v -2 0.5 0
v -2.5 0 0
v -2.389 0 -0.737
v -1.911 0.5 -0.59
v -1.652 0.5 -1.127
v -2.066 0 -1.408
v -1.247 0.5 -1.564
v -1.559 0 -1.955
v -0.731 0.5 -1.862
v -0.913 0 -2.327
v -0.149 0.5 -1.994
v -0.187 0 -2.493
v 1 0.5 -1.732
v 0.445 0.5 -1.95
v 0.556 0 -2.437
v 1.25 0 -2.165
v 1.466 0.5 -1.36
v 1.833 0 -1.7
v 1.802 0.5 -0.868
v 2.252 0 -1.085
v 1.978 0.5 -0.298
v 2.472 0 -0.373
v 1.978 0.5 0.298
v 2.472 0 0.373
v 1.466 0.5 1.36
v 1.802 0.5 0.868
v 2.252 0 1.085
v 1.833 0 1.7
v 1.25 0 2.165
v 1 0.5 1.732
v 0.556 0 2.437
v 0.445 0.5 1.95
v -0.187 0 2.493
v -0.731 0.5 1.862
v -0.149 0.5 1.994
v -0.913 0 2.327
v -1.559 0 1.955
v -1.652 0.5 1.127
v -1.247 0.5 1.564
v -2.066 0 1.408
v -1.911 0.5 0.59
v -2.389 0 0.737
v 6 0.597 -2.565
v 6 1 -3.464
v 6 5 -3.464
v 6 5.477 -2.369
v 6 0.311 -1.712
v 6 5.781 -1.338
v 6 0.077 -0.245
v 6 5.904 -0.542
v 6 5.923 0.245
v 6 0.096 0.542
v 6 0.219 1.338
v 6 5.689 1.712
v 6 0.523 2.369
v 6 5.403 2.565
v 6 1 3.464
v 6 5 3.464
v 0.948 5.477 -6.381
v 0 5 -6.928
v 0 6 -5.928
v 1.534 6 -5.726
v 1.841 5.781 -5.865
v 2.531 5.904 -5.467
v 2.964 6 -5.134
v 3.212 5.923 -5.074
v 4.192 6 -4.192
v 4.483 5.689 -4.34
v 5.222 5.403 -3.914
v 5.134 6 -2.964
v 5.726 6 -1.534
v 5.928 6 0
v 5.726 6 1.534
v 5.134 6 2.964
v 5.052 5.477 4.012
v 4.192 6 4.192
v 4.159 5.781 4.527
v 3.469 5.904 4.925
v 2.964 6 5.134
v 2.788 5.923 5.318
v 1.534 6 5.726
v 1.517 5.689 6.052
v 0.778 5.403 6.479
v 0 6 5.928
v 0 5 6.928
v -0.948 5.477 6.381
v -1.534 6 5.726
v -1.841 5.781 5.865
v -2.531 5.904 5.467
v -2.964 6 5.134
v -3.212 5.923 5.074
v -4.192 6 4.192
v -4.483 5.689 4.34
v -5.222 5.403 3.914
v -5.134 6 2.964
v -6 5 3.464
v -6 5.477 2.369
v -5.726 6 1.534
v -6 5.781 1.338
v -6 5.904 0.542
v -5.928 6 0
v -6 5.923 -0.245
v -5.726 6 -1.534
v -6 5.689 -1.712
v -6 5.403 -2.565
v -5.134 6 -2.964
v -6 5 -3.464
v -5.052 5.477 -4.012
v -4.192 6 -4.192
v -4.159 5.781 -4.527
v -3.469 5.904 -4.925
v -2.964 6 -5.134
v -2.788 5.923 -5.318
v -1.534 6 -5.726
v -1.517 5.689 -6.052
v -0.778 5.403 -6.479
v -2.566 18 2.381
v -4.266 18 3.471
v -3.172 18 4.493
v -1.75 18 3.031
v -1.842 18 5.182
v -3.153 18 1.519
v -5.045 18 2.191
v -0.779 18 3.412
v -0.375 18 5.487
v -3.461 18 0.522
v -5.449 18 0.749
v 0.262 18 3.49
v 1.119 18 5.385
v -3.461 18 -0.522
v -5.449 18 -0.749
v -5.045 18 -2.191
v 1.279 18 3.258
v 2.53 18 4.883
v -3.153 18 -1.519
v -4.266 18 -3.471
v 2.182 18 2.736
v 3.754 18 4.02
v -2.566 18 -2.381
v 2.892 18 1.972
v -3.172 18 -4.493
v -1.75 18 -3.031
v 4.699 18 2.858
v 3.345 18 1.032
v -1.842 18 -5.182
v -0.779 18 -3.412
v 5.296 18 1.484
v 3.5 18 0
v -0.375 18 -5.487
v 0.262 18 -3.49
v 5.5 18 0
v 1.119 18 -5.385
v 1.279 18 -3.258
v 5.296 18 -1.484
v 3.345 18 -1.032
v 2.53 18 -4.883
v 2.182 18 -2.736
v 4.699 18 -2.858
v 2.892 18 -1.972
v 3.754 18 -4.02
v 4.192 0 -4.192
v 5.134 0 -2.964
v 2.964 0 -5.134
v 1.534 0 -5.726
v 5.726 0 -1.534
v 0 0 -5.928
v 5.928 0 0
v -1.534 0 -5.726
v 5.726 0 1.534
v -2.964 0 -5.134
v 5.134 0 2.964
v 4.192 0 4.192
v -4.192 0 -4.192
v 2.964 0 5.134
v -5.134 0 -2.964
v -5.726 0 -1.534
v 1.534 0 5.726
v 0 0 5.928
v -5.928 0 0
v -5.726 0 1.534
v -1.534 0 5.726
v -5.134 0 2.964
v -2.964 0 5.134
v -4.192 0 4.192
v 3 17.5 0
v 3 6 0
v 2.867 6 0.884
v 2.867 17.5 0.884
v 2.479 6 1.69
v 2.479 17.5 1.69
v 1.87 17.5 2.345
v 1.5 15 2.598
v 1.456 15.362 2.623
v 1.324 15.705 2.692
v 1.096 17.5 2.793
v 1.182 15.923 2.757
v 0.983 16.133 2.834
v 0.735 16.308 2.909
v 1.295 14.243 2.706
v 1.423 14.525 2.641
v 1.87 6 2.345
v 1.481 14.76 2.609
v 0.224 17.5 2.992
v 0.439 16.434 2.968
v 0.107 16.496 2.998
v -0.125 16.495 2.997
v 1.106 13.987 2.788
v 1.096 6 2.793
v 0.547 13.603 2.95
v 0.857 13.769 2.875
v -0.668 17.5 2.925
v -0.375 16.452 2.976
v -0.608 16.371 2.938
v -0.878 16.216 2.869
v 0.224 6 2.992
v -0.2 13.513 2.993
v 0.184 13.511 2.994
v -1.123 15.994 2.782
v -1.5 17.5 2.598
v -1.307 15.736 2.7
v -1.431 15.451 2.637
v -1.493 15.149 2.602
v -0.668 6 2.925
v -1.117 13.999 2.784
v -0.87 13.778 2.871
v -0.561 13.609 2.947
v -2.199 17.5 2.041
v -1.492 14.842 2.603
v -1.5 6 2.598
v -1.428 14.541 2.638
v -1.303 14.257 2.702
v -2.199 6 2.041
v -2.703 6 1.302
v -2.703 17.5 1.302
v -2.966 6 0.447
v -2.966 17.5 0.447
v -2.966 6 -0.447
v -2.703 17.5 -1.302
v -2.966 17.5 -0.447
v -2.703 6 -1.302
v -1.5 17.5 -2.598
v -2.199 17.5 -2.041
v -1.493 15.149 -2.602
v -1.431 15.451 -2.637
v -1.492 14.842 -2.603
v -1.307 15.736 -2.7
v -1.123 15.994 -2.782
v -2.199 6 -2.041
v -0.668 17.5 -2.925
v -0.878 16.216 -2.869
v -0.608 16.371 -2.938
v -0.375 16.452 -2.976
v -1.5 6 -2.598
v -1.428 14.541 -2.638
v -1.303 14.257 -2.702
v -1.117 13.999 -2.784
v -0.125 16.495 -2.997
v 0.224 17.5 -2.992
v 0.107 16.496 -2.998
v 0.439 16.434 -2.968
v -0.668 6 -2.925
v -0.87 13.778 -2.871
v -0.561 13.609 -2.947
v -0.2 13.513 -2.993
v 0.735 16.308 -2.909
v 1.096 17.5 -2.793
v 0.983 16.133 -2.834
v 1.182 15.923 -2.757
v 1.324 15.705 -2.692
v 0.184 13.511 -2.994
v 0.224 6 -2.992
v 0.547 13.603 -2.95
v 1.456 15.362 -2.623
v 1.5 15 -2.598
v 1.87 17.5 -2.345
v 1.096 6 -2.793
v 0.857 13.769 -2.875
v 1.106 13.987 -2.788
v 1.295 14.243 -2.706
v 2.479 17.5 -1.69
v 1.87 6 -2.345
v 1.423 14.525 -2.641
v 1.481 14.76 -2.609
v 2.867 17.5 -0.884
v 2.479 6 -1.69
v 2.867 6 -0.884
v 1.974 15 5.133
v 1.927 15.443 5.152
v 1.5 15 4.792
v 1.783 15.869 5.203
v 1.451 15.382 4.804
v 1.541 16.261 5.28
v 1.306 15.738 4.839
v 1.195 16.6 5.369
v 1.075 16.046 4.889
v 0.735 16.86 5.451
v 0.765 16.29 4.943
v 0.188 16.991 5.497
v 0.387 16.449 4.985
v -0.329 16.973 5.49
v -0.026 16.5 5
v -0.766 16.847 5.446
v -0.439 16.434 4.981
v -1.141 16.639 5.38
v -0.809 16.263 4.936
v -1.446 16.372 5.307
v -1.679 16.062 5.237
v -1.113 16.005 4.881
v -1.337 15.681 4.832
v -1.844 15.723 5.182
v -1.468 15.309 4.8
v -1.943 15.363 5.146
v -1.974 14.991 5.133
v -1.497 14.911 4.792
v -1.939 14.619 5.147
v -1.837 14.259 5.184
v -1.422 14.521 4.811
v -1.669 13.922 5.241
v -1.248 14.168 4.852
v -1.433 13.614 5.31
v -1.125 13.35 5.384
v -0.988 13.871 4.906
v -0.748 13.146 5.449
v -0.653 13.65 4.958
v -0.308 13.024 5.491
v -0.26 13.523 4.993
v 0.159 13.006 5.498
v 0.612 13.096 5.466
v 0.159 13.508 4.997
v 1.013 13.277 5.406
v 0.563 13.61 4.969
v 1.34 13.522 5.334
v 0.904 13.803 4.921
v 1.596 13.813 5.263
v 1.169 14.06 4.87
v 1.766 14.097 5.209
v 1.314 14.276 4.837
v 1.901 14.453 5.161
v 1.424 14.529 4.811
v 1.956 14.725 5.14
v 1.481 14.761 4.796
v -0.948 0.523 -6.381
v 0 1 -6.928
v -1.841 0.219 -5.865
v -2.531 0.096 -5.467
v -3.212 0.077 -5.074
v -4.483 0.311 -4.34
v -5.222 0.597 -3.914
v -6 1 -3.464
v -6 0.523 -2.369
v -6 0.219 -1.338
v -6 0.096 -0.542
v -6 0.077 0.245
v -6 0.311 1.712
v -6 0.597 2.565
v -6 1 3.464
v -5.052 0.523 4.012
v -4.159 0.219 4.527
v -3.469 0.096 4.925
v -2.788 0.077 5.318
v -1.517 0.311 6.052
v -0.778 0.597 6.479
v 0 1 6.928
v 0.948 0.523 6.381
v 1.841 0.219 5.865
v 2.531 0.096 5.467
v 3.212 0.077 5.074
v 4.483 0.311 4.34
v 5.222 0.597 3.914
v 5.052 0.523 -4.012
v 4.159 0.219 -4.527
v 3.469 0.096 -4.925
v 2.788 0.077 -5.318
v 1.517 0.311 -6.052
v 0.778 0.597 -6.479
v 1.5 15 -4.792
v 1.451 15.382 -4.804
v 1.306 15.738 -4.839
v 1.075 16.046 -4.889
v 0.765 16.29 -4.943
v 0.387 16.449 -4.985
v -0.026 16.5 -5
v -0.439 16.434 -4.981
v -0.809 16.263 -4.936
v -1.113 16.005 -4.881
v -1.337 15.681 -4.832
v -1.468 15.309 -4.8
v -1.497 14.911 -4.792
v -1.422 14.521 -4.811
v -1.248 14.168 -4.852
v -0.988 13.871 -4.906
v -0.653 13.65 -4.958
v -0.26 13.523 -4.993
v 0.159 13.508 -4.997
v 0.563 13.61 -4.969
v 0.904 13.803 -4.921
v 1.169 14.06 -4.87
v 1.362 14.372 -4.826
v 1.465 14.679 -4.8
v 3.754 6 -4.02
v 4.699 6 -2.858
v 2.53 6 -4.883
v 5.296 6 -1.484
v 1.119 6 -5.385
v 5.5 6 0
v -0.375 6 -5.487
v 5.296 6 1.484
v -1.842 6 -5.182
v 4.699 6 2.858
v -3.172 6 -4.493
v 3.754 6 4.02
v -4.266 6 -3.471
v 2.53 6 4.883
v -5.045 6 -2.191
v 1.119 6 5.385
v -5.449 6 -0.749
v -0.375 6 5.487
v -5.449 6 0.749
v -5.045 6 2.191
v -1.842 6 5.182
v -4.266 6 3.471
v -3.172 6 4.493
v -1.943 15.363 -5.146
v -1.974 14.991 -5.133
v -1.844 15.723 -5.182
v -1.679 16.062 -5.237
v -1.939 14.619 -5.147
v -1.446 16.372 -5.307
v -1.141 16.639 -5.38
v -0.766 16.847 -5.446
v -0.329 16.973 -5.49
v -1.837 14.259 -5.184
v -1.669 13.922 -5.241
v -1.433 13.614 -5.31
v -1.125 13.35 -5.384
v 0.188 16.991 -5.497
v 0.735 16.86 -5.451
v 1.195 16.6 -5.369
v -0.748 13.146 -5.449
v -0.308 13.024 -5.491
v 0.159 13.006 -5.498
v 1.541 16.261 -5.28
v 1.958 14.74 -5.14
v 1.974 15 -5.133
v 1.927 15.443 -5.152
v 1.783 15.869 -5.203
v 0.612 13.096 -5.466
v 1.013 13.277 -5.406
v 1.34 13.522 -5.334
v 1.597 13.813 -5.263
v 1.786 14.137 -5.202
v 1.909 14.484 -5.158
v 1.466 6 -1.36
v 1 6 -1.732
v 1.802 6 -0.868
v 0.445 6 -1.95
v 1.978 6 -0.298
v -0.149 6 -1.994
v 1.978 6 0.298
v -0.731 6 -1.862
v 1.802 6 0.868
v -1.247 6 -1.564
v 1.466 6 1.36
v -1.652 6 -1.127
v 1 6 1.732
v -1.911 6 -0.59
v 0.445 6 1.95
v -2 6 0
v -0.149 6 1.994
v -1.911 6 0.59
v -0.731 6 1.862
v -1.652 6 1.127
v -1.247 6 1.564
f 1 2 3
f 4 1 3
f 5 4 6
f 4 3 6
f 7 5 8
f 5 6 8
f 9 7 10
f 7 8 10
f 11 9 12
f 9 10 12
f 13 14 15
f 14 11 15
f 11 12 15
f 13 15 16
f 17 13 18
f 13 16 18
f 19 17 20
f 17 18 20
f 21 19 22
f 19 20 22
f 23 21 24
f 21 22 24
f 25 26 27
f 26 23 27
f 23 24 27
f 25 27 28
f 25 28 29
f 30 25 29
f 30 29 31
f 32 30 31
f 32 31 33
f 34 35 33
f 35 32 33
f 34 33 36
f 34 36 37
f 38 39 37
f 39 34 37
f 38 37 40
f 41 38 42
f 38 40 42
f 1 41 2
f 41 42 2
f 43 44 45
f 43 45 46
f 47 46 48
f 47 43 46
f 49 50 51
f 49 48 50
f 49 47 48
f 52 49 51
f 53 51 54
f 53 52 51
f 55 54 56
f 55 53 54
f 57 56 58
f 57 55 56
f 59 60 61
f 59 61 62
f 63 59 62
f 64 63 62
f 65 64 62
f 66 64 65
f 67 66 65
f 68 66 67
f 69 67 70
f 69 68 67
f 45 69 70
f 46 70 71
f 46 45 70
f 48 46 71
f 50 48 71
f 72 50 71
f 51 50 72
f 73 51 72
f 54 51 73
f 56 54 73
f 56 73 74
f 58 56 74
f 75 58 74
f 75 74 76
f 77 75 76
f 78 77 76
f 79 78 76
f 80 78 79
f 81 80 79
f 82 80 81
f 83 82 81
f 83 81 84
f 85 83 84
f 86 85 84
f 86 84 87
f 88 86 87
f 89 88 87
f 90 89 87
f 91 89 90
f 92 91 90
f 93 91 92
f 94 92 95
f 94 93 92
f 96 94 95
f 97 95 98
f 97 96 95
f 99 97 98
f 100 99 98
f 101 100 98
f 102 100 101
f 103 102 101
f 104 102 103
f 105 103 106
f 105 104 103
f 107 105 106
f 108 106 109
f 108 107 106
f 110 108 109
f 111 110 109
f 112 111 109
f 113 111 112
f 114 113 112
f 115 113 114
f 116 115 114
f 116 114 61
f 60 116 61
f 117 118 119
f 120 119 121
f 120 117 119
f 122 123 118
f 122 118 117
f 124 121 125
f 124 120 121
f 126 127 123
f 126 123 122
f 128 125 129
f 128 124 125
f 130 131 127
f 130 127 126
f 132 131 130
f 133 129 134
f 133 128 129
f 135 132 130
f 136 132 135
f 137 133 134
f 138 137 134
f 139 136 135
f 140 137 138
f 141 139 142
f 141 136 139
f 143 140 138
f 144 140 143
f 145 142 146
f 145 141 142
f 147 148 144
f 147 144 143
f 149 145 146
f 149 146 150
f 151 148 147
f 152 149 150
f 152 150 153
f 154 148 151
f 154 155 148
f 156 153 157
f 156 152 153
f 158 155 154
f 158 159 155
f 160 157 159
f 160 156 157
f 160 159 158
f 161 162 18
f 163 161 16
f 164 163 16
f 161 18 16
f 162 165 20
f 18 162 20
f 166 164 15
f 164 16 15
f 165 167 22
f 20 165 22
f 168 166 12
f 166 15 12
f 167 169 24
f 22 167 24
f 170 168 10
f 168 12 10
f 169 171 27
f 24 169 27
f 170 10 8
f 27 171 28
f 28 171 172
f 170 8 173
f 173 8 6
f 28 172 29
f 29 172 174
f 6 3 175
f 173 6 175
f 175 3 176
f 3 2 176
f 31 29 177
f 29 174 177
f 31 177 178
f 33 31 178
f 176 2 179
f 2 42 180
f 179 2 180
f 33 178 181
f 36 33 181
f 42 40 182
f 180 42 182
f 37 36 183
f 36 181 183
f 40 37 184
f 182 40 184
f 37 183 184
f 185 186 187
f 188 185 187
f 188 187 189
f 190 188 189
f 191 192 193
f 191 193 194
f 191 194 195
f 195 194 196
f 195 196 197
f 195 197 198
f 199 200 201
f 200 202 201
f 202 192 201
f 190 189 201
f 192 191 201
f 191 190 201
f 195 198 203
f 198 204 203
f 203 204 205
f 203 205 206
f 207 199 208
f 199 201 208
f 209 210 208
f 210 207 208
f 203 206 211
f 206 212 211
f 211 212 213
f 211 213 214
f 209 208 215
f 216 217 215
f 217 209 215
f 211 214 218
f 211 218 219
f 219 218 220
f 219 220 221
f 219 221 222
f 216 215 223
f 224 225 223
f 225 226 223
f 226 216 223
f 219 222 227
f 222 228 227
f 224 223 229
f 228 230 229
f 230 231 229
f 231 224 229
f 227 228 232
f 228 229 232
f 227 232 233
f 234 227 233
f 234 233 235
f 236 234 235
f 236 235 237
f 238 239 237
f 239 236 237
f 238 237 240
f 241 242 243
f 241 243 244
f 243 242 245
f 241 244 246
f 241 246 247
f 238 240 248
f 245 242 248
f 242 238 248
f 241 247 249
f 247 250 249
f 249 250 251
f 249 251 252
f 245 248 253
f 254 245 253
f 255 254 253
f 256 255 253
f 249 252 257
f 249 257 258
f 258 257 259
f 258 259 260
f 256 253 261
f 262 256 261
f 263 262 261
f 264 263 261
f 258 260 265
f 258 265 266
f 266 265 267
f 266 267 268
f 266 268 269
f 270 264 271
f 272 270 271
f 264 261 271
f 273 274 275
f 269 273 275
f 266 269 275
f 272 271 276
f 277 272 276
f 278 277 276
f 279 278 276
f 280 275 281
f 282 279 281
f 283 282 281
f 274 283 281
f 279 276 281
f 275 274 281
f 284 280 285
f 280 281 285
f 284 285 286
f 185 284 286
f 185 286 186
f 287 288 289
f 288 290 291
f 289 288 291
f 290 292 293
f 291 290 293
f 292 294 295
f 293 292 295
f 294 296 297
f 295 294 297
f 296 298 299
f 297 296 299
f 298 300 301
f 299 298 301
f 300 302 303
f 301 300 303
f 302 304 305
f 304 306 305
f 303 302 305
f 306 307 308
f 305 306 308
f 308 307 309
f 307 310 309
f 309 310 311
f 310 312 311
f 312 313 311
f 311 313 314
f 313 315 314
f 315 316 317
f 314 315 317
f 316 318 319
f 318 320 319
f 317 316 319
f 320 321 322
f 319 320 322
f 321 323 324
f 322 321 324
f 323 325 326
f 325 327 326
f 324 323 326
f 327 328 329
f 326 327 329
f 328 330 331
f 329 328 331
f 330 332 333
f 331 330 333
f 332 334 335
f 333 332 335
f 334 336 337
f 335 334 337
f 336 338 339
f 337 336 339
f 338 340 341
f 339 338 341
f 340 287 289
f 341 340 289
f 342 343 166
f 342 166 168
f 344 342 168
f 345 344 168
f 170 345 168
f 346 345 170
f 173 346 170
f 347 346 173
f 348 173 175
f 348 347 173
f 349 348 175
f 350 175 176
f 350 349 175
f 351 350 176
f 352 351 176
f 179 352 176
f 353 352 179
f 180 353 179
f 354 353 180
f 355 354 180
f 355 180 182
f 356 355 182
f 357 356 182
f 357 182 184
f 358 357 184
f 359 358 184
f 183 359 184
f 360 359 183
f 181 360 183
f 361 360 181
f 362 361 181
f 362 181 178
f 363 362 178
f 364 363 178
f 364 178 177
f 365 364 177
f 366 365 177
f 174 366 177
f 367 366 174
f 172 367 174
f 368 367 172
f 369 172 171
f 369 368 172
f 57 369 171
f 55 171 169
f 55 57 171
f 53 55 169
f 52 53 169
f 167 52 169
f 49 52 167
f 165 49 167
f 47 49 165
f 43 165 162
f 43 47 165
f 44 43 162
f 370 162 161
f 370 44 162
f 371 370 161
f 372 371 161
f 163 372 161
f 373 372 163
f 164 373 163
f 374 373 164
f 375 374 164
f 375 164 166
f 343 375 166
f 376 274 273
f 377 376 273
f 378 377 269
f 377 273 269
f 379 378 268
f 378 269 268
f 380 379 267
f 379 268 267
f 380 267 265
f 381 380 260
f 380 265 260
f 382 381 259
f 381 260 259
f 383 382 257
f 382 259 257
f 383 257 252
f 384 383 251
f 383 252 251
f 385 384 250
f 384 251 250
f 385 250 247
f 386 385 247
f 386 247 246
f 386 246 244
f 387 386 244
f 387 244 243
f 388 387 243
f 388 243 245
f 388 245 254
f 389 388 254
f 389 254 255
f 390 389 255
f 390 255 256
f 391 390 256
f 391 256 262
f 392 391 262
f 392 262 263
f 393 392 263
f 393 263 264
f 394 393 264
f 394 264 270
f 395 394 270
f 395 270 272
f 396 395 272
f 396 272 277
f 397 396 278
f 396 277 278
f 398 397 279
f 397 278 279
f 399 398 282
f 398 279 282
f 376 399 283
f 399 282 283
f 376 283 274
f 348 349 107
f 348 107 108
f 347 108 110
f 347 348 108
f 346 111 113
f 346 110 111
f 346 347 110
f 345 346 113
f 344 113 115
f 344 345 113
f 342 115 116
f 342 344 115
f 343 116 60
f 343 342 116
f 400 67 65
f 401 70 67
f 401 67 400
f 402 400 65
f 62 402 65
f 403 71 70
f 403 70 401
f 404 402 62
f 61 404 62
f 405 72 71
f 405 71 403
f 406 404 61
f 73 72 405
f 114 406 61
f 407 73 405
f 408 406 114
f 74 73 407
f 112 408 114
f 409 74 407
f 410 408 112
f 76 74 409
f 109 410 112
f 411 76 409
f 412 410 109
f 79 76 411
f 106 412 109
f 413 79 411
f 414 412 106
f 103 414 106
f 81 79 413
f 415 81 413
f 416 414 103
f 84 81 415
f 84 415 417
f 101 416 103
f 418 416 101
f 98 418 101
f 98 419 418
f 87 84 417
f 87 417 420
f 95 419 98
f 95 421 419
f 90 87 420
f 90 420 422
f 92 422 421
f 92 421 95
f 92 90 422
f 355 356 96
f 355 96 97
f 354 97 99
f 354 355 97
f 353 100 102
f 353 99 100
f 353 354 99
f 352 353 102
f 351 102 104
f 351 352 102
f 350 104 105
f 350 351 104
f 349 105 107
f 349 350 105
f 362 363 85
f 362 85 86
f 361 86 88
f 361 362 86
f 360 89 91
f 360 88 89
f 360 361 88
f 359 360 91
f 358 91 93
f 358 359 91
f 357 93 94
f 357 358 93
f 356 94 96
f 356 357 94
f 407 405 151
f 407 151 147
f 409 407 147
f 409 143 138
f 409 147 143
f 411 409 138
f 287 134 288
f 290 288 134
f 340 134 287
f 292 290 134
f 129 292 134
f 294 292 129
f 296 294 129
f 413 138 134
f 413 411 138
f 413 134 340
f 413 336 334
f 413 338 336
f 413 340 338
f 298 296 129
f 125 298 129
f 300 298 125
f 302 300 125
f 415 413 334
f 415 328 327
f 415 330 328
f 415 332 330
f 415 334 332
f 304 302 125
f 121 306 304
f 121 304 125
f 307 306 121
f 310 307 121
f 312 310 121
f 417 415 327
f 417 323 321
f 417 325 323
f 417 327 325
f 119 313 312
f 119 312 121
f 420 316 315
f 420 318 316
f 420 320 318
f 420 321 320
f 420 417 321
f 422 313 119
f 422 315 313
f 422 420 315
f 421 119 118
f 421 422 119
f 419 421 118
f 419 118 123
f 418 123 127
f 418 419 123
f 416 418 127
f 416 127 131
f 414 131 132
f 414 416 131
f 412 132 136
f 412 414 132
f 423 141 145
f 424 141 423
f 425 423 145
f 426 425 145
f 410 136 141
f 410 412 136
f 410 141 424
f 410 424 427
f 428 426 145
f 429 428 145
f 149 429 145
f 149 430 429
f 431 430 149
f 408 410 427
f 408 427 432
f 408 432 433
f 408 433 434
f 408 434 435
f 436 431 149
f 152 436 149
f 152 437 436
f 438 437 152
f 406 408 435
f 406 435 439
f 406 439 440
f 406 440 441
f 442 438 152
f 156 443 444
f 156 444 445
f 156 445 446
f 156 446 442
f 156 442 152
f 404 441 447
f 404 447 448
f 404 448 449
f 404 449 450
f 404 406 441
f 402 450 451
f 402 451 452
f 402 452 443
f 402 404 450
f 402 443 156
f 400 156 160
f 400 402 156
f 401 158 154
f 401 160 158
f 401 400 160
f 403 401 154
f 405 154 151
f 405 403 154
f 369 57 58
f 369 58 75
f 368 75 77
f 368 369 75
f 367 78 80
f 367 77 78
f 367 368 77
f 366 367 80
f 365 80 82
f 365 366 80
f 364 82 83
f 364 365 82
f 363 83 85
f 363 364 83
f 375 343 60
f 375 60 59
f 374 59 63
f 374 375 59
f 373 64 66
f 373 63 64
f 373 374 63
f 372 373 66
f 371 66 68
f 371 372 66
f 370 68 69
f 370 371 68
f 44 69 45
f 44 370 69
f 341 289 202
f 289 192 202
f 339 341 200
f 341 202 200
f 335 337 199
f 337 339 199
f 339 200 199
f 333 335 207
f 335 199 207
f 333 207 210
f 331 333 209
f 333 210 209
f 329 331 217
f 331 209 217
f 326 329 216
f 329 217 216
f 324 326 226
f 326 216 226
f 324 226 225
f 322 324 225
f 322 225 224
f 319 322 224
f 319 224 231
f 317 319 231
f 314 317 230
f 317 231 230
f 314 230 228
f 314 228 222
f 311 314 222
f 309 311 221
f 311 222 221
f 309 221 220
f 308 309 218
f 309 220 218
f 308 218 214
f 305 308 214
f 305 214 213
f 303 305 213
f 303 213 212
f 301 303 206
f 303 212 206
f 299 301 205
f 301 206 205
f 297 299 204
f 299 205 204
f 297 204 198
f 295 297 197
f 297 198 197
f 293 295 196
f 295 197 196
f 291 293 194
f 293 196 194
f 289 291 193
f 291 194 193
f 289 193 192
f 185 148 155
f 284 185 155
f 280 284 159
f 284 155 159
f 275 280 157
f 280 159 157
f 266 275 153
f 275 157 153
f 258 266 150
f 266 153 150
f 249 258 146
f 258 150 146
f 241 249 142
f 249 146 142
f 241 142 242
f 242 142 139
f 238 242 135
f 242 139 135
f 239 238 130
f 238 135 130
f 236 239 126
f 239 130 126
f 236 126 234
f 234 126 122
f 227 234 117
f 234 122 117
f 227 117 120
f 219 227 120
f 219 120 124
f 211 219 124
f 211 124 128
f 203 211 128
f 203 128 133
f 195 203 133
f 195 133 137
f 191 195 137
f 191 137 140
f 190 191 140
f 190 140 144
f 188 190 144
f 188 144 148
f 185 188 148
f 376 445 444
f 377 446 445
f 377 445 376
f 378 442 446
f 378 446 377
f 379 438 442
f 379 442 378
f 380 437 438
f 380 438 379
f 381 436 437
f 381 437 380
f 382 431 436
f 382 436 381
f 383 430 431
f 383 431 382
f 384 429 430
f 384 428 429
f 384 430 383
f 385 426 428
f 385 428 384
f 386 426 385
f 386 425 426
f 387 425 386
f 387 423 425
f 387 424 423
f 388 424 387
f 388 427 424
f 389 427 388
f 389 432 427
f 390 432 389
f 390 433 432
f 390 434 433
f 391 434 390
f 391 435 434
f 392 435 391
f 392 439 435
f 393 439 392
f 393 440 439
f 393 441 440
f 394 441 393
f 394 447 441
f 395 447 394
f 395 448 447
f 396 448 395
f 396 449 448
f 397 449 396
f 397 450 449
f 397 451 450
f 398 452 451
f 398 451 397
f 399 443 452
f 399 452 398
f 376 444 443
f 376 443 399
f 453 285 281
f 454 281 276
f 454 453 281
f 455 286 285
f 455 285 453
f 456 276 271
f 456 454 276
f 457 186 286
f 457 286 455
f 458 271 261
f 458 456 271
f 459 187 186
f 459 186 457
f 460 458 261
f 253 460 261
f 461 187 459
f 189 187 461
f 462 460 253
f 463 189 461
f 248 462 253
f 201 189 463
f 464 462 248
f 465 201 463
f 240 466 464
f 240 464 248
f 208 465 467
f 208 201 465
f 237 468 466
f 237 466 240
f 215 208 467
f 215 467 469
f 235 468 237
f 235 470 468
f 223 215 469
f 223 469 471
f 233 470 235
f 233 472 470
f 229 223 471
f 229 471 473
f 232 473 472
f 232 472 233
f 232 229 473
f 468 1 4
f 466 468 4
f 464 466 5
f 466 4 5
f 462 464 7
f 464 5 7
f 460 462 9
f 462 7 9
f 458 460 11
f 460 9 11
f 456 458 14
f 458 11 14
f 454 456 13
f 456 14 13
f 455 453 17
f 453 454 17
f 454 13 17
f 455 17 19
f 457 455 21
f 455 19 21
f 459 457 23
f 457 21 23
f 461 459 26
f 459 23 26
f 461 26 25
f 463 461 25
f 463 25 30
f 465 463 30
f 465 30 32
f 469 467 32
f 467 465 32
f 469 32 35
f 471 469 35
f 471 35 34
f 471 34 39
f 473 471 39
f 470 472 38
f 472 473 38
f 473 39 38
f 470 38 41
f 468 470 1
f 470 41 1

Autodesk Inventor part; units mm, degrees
ref_plane "YZ Plane" through (0, 0, 0) normal (1, 0, 0) x (0, 1, 0)
ref_plane "XZ Plane" through (0, 0, 0) normal (0, 1, 0) x (-1, 0, 0)
ref_plane "XY Plane" through (0, 0, 0) normal (0, 0, 1) x (1, 0, 0)
sketch "Sketch1" plane through (0, 0, 0) normal (0, 1, 0) x (-1, 0, 0)
  line L0 (6, -3.4641) -> (0, -6.9282)
  line L1 (0, -6.9282) -> (-6, -3.4641)
  line L2 (-6, -3.4641) -> (-6, 3.4641)
  line L3 (-6, 3.4641) -> (0, 6.9282)
  line L4 (0, 6.9282) -> (6, 3.4641)
  line L5 (6, 3.4641) -> (6, -3.4641)
  circle A0 centre (0, 0) radius 2
  dimension "d0" = 6
  dimension "d1" = 4
extrude "Extrusion1" add sketch "Sketch1" along normal blind 6
sketch "Sketch2" plane through (0, 6, 0) normal (0, 1, 0) x (1, 0, 0)
  circle A0 centre (0, 0) radius 3
  circle A1 centre (0, 0) radius 5.5
  dimension "d4" = 6
  dimension "d5" = 11
extrude "Extrusion2" add sketch "Sketch2" along normal blind 12
sketch "Sketch3" plane through (0, 0, 0) normal (0, 0, 1) x (1, 0, 0)
  circle A0 centre (0, 15) radius 1.5
  line L0 (0, 0) -> (0, 6) projected
  line L1 (5.5, 18) -> (-5.5, 18) projected
  dimension "d16" = 3
  dimension "d44" = 0
  dimension "d45" = 3
extrude "Extrusion3" cut sketch "Sketch3" along normal mid plane 24
chamfer "Chamfer" distance 0.5 angle 45 4 edges at (2, 0, 0) (-3, 18, 0) (-1.5, 15.0054, -5.2915) (-1.5, 15.0054, 5.2915)
sketch "Sketch4" plane through (0, 0, 0) normal (1, 0, 0) x (0, 1, 0)
  line L0 (0, -3.4641) -> (0, -6.9282) projected
  line L1 (0, -6.9282) -> (0, -5.9282)
  line L2 (0, -6.9282) -> (1, -6.9282)
  line L3 (1, -6.9282) -> (0, -5.9282)
  line L4 (-6, 0) -> (36, 0) projected
  line L5 (0, -6.9282) -> (6, -6.9282) projected
  line L6 (6, -6.9282) -> (5, -6.9282)
  line L7 (6, -6.9282) -> (6, -5.9282)
  line L8 (6, -5.9282) -> (5, -6.9282)
  dimension "d31" = 1
  dimension "d32" = 1
  dimension "d36" = 1
  dimension "d37" = 1
revolve "Revolution" cut sketch "Sketch4" angle 360 about axis through (0, -10, 0) along (0, 1, 0)
thread "Thread1" size "M3x0.5" class "6H" standard "ANSI Metric M Profile" full length
thread "Thread2" size "M3x0.5" class "6H" standard "ANSI Metric M Profile" full length
thread "Thread3" size "M4x0.7" class "6H" standard "ANSI Metric M Profile" full length
properties part number "6mmID_30mmL_hex_adapter"
